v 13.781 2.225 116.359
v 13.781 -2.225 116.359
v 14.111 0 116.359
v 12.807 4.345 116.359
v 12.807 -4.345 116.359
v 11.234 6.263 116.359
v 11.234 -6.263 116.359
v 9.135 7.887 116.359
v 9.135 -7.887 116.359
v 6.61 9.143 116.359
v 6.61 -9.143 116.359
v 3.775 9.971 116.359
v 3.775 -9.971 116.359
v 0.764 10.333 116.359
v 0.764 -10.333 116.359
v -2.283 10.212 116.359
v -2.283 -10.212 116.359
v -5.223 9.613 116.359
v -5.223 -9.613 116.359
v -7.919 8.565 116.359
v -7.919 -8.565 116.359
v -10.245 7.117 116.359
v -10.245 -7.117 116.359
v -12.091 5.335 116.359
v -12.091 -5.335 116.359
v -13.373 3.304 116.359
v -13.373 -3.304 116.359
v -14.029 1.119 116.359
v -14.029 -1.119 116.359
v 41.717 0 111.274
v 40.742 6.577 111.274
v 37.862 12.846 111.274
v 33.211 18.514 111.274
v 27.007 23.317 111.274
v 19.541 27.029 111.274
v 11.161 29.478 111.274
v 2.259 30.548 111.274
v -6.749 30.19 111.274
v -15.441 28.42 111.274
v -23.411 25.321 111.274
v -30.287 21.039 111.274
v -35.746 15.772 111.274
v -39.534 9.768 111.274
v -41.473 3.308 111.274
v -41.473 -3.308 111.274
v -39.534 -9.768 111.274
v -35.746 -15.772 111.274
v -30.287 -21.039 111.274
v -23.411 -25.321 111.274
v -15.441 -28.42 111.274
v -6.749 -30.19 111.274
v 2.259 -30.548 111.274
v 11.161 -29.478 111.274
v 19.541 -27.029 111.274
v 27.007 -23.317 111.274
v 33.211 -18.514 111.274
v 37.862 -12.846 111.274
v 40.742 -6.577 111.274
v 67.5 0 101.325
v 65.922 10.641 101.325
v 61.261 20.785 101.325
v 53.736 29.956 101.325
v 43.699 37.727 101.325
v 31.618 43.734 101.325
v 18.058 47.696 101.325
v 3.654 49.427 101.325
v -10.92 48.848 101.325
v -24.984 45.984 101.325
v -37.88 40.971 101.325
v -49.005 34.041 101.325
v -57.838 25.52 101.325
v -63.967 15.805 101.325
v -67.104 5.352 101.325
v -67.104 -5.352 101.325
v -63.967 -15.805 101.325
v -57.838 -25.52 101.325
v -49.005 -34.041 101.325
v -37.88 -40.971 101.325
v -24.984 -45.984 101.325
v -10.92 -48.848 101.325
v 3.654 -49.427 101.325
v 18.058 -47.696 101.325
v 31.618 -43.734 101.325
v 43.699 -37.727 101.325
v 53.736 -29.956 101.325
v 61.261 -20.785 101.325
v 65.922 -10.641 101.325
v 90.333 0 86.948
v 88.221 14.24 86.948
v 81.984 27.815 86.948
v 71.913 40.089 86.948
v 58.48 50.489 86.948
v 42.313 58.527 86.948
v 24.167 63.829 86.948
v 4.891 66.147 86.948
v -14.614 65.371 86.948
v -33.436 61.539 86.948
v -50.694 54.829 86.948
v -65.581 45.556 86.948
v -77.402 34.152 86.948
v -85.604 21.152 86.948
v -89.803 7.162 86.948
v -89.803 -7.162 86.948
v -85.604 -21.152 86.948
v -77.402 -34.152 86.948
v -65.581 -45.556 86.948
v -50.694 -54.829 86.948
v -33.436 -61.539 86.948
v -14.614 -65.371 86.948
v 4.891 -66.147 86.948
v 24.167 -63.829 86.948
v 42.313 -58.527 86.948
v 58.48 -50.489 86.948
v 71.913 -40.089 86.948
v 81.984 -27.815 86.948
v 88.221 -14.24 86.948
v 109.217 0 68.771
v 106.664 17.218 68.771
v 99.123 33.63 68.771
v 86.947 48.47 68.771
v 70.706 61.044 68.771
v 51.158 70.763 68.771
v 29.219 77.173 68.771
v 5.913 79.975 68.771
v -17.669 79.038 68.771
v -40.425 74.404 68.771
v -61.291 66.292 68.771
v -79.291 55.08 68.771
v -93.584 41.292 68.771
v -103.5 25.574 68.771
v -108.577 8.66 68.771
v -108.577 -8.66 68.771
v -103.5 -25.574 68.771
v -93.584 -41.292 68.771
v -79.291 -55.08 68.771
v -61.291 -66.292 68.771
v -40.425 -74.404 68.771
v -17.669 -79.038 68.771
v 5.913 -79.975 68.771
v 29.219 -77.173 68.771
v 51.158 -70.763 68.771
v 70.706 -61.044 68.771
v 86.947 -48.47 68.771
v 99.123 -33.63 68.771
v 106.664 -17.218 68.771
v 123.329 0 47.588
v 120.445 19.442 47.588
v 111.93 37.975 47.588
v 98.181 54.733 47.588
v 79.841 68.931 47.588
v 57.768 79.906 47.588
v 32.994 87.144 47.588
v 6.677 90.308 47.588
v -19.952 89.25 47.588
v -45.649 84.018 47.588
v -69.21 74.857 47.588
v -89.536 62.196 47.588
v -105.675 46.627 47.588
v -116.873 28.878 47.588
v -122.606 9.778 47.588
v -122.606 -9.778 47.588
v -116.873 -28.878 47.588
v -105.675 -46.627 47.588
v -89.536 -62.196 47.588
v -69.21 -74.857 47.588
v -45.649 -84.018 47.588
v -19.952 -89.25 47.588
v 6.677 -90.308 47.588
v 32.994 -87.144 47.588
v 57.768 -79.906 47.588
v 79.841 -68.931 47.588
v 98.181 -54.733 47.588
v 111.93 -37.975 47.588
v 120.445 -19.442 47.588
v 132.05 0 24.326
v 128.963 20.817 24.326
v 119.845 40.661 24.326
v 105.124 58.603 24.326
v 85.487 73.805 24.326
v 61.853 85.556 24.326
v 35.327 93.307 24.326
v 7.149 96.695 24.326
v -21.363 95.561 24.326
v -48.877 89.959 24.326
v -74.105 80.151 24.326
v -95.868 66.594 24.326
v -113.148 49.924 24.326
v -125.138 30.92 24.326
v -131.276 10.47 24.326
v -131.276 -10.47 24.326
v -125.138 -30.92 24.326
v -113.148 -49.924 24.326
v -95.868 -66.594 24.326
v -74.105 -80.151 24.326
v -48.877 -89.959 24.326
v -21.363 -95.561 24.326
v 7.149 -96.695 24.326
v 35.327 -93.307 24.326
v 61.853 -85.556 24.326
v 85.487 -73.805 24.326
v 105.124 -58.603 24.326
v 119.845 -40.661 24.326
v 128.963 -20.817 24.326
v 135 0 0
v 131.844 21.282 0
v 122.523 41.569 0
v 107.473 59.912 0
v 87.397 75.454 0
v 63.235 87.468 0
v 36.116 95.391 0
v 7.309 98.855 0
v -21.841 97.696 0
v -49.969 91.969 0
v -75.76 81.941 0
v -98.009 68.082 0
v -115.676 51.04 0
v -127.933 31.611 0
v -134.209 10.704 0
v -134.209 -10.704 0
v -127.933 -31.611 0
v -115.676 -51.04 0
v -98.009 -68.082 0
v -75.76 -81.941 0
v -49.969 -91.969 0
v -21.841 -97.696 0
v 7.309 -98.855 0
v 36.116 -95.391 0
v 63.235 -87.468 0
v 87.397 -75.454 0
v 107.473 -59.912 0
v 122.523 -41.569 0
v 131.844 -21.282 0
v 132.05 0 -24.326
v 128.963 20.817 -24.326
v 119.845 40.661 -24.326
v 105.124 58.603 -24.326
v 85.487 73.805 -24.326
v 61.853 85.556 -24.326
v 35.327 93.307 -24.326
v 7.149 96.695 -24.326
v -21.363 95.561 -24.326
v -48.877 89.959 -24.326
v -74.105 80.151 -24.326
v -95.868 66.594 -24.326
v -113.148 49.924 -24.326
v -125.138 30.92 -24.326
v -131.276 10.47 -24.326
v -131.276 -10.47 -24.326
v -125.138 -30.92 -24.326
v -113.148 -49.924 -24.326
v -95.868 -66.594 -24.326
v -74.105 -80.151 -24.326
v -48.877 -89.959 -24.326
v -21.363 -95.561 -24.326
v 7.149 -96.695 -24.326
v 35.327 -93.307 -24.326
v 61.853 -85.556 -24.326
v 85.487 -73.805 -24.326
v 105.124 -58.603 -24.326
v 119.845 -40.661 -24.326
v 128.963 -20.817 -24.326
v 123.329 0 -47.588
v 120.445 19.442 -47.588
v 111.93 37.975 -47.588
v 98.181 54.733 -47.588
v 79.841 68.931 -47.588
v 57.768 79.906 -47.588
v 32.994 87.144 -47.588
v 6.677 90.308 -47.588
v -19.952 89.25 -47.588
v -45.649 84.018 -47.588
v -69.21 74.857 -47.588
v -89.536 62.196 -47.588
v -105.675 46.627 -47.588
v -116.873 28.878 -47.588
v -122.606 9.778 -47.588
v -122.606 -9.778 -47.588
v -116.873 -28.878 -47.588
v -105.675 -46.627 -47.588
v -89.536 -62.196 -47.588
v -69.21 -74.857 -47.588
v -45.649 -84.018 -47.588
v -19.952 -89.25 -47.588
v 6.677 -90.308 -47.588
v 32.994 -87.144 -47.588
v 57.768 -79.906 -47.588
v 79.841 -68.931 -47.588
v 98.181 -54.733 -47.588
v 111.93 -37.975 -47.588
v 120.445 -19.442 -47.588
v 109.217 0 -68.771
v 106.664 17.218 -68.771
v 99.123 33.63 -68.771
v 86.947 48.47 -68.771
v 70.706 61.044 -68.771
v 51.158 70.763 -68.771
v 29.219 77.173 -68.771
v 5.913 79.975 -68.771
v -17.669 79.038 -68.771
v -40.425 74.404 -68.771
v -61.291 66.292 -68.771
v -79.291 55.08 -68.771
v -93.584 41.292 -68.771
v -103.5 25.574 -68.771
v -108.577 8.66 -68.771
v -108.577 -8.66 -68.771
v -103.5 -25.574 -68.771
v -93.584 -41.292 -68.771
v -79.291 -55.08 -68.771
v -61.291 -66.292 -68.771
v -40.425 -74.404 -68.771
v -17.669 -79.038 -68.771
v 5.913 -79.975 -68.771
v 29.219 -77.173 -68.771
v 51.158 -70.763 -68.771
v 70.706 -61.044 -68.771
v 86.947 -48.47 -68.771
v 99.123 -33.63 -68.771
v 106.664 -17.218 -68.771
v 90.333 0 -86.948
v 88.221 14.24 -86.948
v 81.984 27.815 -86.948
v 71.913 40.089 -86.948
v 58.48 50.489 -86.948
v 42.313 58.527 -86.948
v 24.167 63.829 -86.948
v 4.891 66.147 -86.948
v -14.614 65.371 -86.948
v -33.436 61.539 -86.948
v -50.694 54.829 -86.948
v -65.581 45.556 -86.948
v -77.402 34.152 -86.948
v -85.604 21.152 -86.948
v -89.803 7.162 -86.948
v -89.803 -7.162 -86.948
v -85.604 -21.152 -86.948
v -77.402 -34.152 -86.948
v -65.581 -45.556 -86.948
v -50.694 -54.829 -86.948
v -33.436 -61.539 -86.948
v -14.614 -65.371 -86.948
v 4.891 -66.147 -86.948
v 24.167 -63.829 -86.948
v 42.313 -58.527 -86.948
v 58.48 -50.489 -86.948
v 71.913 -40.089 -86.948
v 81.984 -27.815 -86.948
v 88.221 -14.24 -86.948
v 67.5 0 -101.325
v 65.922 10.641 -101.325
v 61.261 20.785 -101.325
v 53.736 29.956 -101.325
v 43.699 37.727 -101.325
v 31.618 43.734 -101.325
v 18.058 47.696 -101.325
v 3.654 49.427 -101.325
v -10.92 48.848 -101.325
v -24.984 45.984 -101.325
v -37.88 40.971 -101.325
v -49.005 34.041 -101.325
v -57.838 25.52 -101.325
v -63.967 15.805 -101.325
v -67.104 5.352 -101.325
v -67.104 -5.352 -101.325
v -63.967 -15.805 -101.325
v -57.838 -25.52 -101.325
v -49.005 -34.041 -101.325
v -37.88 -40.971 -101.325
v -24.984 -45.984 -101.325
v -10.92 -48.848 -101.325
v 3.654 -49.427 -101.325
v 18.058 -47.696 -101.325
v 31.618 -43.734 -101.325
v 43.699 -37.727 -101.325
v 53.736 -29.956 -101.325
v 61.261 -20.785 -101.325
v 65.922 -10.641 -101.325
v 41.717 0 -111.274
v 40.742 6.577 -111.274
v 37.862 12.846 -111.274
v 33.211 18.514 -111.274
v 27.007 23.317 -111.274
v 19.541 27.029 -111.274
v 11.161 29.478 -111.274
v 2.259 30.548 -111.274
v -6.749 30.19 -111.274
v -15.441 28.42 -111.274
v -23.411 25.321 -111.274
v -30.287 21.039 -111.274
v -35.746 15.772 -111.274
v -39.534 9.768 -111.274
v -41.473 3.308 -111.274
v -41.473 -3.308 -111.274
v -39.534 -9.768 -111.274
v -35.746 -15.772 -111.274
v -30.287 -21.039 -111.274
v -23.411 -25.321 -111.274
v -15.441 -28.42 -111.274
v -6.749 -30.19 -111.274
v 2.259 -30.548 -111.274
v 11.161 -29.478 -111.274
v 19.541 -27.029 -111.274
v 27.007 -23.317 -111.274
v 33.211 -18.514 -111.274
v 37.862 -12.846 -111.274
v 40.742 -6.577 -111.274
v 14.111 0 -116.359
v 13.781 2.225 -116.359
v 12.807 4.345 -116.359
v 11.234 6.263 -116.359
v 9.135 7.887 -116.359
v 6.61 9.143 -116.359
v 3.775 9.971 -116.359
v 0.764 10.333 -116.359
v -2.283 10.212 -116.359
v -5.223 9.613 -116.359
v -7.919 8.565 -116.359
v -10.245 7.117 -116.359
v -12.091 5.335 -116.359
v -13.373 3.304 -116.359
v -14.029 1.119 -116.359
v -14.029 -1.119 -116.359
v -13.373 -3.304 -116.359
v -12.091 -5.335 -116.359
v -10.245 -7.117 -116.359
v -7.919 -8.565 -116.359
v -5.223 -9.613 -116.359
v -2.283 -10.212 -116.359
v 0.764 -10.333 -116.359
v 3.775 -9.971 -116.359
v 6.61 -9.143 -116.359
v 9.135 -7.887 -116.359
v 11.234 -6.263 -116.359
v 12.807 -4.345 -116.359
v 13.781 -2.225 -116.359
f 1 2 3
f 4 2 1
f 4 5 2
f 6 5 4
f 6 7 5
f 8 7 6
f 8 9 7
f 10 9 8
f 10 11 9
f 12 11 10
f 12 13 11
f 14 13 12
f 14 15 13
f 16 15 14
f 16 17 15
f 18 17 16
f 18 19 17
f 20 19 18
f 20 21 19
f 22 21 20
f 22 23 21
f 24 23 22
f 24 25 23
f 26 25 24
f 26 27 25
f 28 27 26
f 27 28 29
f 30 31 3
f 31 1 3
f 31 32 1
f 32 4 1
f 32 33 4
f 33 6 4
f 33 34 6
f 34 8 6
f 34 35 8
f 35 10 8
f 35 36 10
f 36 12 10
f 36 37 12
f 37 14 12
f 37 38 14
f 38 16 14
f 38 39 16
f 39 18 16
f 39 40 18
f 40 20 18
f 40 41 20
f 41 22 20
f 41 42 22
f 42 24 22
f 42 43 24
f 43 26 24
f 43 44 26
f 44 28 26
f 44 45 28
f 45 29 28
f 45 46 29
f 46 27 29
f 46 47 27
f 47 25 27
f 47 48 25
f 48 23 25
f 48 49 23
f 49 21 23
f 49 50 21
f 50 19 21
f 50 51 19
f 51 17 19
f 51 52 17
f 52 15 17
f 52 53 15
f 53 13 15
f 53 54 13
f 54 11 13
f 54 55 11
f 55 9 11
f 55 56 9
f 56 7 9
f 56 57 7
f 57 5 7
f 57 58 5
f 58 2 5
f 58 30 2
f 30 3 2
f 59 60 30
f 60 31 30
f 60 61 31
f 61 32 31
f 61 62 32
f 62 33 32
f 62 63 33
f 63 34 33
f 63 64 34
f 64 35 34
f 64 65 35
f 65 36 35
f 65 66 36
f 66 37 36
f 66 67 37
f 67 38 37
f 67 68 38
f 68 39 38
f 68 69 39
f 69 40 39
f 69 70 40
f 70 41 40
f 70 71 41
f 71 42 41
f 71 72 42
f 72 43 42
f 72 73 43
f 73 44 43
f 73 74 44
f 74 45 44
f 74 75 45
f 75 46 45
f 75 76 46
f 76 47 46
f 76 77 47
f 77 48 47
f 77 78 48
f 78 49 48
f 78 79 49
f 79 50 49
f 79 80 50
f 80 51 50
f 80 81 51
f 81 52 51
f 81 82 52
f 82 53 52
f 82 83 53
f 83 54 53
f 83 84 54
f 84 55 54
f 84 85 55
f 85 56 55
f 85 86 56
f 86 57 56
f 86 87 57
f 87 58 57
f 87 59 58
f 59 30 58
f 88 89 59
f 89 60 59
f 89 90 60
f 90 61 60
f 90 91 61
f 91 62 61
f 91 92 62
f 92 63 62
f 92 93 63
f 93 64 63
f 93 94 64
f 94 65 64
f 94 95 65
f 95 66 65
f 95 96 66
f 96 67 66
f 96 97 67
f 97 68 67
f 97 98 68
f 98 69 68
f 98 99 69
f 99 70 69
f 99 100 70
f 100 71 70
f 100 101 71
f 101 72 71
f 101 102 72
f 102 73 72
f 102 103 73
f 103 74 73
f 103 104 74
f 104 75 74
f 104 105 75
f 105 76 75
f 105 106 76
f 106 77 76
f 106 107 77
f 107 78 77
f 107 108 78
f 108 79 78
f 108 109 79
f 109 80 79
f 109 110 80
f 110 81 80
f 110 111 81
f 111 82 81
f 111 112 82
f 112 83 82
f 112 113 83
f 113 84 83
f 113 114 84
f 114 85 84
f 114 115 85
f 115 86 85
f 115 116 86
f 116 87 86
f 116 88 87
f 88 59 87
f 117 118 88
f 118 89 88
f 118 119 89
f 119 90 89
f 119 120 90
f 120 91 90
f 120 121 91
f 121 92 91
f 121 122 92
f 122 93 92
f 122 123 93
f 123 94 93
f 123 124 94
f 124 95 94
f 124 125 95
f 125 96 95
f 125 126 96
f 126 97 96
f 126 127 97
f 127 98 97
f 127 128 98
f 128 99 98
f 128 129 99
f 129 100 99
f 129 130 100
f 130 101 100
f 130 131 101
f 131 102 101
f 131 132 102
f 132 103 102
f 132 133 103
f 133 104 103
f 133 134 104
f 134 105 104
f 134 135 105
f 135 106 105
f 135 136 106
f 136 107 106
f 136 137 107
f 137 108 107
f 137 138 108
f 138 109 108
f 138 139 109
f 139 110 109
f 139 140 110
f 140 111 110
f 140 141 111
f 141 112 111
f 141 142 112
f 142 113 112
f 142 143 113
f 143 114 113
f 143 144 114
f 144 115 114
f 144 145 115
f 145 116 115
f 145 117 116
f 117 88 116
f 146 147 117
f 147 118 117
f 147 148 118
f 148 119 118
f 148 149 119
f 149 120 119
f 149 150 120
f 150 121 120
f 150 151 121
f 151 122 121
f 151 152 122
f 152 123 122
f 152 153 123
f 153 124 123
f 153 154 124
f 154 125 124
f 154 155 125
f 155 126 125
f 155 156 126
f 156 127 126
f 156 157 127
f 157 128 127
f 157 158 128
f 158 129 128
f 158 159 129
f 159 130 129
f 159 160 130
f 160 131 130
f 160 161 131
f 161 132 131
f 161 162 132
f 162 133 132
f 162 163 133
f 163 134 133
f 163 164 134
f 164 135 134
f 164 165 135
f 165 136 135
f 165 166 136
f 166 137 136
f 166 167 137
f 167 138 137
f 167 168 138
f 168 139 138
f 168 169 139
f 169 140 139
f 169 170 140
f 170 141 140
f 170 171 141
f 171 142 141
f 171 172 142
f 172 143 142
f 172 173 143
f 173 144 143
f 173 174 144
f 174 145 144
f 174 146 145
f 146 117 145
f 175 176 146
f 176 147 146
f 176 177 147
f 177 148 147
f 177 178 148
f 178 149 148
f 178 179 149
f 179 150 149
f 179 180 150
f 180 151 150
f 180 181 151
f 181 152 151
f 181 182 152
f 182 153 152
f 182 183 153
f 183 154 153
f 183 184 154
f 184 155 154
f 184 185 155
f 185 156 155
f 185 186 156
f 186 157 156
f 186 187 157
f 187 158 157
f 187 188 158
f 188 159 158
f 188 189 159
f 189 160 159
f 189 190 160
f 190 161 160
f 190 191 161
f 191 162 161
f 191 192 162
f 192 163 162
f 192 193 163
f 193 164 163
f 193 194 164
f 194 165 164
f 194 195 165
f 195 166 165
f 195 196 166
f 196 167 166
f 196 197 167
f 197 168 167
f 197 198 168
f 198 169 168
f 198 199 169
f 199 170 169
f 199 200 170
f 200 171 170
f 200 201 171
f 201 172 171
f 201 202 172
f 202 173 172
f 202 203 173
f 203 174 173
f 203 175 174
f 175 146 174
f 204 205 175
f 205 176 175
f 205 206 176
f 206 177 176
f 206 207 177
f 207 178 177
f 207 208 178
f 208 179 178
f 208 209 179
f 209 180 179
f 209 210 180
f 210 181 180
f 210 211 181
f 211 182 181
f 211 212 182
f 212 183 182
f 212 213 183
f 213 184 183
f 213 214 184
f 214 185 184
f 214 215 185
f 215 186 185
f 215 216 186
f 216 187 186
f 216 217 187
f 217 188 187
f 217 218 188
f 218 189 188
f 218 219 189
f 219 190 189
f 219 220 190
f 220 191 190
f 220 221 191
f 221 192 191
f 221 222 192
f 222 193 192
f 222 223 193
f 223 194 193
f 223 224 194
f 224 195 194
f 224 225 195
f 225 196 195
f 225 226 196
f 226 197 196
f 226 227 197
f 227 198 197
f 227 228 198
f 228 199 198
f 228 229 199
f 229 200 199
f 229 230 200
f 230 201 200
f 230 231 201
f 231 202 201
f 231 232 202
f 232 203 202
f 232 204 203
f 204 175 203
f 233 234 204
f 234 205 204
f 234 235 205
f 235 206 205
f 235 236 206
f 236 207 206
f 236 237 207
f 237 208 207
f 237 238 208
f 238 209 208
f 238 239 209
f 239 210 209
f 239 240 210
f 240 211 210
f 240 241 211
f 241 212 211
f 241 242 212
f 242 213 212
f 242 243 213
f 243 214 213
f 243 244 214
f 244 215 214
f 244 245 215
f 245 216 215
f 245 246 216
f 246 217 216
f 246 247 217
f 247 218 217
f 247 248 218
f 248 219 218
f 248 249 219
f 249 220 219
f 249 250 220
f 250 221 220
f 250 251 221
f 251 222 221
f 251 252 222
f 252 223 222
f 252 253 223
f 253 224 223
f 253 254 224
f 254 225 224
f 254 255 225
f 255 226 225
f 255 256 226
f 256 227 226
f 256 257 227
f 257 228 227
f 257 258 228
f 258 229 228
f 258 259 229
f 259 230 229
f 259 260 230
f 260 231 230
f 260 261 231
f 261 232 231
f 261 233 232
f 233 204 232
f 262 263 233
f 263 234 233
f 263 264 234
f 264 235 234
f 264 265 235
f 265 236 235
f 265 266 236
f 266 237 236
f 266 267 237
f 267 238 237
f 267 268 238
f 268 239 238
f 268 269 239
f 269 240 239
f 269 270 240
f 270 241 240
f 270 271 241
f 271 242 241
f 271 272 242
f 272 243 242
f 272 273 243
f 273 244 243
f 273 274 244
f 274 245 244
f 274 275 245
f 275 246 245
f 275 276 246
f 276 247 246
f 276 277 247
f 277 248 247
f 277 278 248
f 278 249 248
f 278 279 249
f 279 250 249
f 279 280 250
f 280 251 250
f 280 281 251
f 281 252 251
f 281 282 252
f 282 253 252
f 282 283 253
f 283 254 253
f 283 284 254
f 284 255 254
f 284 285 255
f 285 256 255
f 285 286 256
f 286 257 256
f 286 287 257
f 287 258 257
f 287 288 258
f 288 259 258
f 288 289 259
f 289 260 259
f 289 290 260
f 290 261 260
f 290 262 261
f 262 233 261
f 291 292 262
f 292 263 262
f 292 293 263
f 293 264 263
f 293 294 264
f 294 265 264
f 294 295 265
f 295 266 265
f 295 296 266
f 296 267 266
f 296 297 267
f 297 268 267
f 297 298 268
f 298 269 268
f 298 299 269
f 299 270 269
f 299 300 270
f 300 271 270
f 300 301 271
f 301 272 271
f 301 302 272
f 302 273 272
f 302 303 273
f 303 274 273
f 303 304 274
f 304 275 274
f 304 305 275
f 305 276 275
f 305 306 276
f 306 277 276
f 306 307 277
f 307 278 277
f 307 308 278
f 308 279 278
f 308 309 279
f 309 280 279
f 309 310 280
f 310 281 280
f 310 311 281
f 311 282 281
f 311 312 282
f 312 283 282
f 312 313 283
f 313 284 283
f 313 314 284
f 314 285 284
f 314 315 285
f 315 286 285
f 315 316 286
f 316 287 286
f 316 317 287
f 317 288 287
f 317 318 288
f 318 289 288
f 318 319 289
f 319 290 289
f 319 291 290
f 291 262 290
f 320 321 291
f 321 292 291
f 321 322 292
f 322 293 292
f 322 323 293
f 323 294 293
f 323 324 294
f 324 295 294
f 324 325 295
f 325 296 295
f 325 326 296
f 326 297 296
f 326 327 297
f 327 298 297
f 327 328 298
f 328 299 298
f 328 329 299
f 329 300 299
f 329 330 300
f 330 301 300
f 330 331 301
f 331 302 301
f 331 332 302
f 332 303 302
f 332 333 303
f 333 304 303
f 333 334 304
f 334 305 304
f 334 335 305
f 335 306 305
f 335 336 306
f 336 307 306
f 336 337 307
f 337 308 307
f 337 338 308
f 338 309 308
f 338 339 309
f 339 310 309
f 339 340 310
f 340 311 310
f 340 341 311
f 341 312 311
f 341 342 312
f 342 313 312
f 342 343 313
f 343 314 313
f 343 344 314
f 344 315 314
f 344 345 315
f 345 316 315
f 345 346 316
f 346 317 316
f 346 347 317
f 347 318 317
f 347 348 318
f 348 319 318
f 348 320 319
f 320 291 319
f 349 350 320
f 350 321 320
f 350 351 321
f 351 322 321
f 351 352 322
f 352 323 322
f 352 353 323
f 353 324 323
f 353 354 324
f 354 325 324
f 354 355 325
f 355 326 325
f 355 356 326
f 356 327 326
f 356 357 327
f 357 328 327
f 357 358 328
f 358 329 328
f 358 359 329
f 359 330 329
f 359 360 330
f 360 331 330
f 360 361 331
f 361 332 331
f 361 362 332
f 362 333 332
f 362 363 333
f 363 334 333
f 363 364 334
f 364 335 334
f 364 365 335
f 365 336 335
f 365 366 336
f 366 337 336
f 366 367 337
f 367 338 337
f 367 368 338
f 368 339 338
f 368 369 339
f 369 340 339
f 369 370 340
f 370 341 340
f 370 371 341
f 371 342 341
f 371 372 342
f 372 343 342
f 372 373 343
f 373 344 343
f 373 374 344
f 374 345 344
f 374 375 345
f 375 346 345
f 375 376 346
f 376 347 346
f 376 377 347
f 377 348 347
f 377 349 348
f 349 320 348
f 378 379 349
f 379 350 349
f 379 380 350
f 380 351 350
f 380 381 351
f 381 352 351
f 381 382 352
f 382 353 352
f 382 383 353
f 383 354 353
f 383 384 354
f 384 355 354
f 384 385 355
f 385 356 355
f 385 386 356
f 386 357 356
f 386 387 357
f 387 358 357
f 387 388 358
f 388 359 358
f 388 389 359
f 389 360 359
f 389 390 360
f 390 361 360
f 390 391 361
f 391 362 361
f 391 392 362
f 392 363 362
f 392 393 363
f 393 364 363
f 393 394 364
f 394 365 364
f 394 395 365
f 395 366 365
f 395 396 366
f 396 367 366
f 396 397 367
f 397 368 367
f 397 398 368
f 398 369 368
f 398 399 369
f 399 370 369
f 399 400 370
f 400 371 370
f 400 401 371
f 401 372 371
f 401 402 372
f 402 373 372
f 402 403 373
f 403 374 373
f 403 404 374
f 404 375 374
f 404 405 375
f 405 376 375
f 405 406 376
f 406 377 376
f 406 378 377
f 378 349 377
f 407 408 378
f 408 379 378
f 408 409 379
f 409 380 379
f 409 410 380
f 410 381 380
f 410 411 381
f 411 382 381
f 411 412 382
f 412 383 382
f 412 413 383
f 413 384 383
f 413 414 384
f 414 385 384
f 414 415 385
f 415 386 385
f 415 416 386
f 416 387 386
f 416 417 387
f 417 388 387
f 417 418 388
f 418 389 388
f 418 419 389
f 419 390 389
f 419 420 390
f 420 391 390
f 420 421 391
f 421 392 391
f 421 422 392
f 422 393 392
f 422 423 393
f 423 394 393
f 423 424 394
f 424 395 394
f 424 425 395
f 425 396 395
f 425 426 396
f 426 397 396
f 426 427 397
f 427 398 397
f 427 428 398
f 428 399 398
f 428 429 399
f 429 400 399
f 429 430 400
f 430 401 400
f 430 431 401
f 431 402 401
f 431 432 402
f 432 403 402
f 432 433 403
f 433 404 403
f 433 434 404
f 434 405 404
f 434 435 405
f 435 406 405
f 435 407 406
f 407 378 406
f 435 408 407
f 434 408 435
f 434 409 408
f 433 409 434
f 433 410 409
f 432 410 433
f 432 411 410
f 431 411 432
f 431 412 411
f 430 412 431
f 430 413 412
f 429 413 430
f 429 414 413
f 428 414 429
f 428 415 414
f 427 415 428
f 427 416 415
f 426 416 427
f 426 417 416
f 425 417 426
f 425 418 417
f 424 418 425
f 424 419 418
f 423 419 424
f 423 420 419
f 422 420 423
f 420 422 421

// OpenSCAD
// Generated by SolidPython 1.0.1 on 2020-07-29 00:46:52


scale(v = [15, 11, 13]) {
	sphere(r = 9);
}
/***********************************************
*********      SolidPython code:      **********
************************************************
 
# import packages: SolidPython
from solid import *
from solid.utils import *
from itertools import chain, combinations, permutations


class Resize:

    def __init__(self, scad_file):
        self.scad_file = scad_file
        #self.scad_file = import_scad(scad_file)
        # cone/cylinder param:
        self.r1 = 0
        self.r2 = 0
        self.h = 0
        # rectangular prism param:
        self.w = 0
        self.l = 0
        # ellipse param:
        self.r = 0

    # import OpenScad code (file name corresponds to shape)


    # classify shape + parameters
    def assign(self, param1, param2, param3):
        if self.scad_file == 'cone.scad':
            self.r1 = param1
            self.r2 = param2
            self.h = param3
        elif self.scad_file == 'cylinder.scad':
            self.r1 = param1
            self.r2 = param2
            self.h = param3
        elif self.scad_file == 'rectangularPrism.scad':
            self.h = param1
            self.l = param2
            self.w = param3
        else:
            self.r = param1
            self.h = param2

    # resize parameters
    def iterate(self):
        x = range(3, 20, 2)
        i = 1
        if self.scad_file == 'cone.scad':
            tempList = list(permutations(x, 2))
            for temp in tempList:
                param1 = temp[0]
                param2 = temp[1]
                filepath = 'produced_scad_files/' + 'cone' + str(param1) + '_' + str(param2) + '_' + '.scad'
                scad_render_to_file(cylinder(h=param1, r1=param2, r2=0), filepath)

        elif self.scad_file == 'cylinder.scad':
            tempList = list(permutations(x, 3))
            for temp in tempList:
                param1 = temp[0]
                param2 = temp[1]
                filepath = 'produced_scad_files/' + 'cylinder' + str(param1) + '_' + str(param2) + '_' + '.scad'
                scad_render_to_file(cylinder(h=param1, r1=param2, r2=param2), filepath)

        elif self.scad_file == 'rectangularPrism.scad':
            tempList = list(permutations(x, 3))
            for temp in tempList:
                param1 = temp[0]
                param2 = temp[1]
                param3 = temp[2]
                filepath = 'produced_scad_files/' + 'rectangularPrism' + str(param1) + '_' + str(param2) + '_' + str(
                    param3) + '.scad'
                scad_render_to_file(cube(size=(param1, param2, param3)), filepath)

        elif self.scad_file == 'ellipse.scad':
            tempList = list(permutations(x, 4))
            for temp in tempList:
                param1 = temp[0]
                param2 = temp[1]
                param3 = temp[2]
                param4 = temp[3]
                filepath = 'produced_scad_files/' + 'ellipse' + str(param1) + '_' + str(param2) + '_' + str(param3) + '_' + str(param4) + '.scad'
                scad_render_to_file(scale([param1, param2, param3])(sphere(r=param4)), filepath)

    def render_to_scadfile(self):
        scad_render_to_file(scad, 'example.scad') 
 
************************************************/
